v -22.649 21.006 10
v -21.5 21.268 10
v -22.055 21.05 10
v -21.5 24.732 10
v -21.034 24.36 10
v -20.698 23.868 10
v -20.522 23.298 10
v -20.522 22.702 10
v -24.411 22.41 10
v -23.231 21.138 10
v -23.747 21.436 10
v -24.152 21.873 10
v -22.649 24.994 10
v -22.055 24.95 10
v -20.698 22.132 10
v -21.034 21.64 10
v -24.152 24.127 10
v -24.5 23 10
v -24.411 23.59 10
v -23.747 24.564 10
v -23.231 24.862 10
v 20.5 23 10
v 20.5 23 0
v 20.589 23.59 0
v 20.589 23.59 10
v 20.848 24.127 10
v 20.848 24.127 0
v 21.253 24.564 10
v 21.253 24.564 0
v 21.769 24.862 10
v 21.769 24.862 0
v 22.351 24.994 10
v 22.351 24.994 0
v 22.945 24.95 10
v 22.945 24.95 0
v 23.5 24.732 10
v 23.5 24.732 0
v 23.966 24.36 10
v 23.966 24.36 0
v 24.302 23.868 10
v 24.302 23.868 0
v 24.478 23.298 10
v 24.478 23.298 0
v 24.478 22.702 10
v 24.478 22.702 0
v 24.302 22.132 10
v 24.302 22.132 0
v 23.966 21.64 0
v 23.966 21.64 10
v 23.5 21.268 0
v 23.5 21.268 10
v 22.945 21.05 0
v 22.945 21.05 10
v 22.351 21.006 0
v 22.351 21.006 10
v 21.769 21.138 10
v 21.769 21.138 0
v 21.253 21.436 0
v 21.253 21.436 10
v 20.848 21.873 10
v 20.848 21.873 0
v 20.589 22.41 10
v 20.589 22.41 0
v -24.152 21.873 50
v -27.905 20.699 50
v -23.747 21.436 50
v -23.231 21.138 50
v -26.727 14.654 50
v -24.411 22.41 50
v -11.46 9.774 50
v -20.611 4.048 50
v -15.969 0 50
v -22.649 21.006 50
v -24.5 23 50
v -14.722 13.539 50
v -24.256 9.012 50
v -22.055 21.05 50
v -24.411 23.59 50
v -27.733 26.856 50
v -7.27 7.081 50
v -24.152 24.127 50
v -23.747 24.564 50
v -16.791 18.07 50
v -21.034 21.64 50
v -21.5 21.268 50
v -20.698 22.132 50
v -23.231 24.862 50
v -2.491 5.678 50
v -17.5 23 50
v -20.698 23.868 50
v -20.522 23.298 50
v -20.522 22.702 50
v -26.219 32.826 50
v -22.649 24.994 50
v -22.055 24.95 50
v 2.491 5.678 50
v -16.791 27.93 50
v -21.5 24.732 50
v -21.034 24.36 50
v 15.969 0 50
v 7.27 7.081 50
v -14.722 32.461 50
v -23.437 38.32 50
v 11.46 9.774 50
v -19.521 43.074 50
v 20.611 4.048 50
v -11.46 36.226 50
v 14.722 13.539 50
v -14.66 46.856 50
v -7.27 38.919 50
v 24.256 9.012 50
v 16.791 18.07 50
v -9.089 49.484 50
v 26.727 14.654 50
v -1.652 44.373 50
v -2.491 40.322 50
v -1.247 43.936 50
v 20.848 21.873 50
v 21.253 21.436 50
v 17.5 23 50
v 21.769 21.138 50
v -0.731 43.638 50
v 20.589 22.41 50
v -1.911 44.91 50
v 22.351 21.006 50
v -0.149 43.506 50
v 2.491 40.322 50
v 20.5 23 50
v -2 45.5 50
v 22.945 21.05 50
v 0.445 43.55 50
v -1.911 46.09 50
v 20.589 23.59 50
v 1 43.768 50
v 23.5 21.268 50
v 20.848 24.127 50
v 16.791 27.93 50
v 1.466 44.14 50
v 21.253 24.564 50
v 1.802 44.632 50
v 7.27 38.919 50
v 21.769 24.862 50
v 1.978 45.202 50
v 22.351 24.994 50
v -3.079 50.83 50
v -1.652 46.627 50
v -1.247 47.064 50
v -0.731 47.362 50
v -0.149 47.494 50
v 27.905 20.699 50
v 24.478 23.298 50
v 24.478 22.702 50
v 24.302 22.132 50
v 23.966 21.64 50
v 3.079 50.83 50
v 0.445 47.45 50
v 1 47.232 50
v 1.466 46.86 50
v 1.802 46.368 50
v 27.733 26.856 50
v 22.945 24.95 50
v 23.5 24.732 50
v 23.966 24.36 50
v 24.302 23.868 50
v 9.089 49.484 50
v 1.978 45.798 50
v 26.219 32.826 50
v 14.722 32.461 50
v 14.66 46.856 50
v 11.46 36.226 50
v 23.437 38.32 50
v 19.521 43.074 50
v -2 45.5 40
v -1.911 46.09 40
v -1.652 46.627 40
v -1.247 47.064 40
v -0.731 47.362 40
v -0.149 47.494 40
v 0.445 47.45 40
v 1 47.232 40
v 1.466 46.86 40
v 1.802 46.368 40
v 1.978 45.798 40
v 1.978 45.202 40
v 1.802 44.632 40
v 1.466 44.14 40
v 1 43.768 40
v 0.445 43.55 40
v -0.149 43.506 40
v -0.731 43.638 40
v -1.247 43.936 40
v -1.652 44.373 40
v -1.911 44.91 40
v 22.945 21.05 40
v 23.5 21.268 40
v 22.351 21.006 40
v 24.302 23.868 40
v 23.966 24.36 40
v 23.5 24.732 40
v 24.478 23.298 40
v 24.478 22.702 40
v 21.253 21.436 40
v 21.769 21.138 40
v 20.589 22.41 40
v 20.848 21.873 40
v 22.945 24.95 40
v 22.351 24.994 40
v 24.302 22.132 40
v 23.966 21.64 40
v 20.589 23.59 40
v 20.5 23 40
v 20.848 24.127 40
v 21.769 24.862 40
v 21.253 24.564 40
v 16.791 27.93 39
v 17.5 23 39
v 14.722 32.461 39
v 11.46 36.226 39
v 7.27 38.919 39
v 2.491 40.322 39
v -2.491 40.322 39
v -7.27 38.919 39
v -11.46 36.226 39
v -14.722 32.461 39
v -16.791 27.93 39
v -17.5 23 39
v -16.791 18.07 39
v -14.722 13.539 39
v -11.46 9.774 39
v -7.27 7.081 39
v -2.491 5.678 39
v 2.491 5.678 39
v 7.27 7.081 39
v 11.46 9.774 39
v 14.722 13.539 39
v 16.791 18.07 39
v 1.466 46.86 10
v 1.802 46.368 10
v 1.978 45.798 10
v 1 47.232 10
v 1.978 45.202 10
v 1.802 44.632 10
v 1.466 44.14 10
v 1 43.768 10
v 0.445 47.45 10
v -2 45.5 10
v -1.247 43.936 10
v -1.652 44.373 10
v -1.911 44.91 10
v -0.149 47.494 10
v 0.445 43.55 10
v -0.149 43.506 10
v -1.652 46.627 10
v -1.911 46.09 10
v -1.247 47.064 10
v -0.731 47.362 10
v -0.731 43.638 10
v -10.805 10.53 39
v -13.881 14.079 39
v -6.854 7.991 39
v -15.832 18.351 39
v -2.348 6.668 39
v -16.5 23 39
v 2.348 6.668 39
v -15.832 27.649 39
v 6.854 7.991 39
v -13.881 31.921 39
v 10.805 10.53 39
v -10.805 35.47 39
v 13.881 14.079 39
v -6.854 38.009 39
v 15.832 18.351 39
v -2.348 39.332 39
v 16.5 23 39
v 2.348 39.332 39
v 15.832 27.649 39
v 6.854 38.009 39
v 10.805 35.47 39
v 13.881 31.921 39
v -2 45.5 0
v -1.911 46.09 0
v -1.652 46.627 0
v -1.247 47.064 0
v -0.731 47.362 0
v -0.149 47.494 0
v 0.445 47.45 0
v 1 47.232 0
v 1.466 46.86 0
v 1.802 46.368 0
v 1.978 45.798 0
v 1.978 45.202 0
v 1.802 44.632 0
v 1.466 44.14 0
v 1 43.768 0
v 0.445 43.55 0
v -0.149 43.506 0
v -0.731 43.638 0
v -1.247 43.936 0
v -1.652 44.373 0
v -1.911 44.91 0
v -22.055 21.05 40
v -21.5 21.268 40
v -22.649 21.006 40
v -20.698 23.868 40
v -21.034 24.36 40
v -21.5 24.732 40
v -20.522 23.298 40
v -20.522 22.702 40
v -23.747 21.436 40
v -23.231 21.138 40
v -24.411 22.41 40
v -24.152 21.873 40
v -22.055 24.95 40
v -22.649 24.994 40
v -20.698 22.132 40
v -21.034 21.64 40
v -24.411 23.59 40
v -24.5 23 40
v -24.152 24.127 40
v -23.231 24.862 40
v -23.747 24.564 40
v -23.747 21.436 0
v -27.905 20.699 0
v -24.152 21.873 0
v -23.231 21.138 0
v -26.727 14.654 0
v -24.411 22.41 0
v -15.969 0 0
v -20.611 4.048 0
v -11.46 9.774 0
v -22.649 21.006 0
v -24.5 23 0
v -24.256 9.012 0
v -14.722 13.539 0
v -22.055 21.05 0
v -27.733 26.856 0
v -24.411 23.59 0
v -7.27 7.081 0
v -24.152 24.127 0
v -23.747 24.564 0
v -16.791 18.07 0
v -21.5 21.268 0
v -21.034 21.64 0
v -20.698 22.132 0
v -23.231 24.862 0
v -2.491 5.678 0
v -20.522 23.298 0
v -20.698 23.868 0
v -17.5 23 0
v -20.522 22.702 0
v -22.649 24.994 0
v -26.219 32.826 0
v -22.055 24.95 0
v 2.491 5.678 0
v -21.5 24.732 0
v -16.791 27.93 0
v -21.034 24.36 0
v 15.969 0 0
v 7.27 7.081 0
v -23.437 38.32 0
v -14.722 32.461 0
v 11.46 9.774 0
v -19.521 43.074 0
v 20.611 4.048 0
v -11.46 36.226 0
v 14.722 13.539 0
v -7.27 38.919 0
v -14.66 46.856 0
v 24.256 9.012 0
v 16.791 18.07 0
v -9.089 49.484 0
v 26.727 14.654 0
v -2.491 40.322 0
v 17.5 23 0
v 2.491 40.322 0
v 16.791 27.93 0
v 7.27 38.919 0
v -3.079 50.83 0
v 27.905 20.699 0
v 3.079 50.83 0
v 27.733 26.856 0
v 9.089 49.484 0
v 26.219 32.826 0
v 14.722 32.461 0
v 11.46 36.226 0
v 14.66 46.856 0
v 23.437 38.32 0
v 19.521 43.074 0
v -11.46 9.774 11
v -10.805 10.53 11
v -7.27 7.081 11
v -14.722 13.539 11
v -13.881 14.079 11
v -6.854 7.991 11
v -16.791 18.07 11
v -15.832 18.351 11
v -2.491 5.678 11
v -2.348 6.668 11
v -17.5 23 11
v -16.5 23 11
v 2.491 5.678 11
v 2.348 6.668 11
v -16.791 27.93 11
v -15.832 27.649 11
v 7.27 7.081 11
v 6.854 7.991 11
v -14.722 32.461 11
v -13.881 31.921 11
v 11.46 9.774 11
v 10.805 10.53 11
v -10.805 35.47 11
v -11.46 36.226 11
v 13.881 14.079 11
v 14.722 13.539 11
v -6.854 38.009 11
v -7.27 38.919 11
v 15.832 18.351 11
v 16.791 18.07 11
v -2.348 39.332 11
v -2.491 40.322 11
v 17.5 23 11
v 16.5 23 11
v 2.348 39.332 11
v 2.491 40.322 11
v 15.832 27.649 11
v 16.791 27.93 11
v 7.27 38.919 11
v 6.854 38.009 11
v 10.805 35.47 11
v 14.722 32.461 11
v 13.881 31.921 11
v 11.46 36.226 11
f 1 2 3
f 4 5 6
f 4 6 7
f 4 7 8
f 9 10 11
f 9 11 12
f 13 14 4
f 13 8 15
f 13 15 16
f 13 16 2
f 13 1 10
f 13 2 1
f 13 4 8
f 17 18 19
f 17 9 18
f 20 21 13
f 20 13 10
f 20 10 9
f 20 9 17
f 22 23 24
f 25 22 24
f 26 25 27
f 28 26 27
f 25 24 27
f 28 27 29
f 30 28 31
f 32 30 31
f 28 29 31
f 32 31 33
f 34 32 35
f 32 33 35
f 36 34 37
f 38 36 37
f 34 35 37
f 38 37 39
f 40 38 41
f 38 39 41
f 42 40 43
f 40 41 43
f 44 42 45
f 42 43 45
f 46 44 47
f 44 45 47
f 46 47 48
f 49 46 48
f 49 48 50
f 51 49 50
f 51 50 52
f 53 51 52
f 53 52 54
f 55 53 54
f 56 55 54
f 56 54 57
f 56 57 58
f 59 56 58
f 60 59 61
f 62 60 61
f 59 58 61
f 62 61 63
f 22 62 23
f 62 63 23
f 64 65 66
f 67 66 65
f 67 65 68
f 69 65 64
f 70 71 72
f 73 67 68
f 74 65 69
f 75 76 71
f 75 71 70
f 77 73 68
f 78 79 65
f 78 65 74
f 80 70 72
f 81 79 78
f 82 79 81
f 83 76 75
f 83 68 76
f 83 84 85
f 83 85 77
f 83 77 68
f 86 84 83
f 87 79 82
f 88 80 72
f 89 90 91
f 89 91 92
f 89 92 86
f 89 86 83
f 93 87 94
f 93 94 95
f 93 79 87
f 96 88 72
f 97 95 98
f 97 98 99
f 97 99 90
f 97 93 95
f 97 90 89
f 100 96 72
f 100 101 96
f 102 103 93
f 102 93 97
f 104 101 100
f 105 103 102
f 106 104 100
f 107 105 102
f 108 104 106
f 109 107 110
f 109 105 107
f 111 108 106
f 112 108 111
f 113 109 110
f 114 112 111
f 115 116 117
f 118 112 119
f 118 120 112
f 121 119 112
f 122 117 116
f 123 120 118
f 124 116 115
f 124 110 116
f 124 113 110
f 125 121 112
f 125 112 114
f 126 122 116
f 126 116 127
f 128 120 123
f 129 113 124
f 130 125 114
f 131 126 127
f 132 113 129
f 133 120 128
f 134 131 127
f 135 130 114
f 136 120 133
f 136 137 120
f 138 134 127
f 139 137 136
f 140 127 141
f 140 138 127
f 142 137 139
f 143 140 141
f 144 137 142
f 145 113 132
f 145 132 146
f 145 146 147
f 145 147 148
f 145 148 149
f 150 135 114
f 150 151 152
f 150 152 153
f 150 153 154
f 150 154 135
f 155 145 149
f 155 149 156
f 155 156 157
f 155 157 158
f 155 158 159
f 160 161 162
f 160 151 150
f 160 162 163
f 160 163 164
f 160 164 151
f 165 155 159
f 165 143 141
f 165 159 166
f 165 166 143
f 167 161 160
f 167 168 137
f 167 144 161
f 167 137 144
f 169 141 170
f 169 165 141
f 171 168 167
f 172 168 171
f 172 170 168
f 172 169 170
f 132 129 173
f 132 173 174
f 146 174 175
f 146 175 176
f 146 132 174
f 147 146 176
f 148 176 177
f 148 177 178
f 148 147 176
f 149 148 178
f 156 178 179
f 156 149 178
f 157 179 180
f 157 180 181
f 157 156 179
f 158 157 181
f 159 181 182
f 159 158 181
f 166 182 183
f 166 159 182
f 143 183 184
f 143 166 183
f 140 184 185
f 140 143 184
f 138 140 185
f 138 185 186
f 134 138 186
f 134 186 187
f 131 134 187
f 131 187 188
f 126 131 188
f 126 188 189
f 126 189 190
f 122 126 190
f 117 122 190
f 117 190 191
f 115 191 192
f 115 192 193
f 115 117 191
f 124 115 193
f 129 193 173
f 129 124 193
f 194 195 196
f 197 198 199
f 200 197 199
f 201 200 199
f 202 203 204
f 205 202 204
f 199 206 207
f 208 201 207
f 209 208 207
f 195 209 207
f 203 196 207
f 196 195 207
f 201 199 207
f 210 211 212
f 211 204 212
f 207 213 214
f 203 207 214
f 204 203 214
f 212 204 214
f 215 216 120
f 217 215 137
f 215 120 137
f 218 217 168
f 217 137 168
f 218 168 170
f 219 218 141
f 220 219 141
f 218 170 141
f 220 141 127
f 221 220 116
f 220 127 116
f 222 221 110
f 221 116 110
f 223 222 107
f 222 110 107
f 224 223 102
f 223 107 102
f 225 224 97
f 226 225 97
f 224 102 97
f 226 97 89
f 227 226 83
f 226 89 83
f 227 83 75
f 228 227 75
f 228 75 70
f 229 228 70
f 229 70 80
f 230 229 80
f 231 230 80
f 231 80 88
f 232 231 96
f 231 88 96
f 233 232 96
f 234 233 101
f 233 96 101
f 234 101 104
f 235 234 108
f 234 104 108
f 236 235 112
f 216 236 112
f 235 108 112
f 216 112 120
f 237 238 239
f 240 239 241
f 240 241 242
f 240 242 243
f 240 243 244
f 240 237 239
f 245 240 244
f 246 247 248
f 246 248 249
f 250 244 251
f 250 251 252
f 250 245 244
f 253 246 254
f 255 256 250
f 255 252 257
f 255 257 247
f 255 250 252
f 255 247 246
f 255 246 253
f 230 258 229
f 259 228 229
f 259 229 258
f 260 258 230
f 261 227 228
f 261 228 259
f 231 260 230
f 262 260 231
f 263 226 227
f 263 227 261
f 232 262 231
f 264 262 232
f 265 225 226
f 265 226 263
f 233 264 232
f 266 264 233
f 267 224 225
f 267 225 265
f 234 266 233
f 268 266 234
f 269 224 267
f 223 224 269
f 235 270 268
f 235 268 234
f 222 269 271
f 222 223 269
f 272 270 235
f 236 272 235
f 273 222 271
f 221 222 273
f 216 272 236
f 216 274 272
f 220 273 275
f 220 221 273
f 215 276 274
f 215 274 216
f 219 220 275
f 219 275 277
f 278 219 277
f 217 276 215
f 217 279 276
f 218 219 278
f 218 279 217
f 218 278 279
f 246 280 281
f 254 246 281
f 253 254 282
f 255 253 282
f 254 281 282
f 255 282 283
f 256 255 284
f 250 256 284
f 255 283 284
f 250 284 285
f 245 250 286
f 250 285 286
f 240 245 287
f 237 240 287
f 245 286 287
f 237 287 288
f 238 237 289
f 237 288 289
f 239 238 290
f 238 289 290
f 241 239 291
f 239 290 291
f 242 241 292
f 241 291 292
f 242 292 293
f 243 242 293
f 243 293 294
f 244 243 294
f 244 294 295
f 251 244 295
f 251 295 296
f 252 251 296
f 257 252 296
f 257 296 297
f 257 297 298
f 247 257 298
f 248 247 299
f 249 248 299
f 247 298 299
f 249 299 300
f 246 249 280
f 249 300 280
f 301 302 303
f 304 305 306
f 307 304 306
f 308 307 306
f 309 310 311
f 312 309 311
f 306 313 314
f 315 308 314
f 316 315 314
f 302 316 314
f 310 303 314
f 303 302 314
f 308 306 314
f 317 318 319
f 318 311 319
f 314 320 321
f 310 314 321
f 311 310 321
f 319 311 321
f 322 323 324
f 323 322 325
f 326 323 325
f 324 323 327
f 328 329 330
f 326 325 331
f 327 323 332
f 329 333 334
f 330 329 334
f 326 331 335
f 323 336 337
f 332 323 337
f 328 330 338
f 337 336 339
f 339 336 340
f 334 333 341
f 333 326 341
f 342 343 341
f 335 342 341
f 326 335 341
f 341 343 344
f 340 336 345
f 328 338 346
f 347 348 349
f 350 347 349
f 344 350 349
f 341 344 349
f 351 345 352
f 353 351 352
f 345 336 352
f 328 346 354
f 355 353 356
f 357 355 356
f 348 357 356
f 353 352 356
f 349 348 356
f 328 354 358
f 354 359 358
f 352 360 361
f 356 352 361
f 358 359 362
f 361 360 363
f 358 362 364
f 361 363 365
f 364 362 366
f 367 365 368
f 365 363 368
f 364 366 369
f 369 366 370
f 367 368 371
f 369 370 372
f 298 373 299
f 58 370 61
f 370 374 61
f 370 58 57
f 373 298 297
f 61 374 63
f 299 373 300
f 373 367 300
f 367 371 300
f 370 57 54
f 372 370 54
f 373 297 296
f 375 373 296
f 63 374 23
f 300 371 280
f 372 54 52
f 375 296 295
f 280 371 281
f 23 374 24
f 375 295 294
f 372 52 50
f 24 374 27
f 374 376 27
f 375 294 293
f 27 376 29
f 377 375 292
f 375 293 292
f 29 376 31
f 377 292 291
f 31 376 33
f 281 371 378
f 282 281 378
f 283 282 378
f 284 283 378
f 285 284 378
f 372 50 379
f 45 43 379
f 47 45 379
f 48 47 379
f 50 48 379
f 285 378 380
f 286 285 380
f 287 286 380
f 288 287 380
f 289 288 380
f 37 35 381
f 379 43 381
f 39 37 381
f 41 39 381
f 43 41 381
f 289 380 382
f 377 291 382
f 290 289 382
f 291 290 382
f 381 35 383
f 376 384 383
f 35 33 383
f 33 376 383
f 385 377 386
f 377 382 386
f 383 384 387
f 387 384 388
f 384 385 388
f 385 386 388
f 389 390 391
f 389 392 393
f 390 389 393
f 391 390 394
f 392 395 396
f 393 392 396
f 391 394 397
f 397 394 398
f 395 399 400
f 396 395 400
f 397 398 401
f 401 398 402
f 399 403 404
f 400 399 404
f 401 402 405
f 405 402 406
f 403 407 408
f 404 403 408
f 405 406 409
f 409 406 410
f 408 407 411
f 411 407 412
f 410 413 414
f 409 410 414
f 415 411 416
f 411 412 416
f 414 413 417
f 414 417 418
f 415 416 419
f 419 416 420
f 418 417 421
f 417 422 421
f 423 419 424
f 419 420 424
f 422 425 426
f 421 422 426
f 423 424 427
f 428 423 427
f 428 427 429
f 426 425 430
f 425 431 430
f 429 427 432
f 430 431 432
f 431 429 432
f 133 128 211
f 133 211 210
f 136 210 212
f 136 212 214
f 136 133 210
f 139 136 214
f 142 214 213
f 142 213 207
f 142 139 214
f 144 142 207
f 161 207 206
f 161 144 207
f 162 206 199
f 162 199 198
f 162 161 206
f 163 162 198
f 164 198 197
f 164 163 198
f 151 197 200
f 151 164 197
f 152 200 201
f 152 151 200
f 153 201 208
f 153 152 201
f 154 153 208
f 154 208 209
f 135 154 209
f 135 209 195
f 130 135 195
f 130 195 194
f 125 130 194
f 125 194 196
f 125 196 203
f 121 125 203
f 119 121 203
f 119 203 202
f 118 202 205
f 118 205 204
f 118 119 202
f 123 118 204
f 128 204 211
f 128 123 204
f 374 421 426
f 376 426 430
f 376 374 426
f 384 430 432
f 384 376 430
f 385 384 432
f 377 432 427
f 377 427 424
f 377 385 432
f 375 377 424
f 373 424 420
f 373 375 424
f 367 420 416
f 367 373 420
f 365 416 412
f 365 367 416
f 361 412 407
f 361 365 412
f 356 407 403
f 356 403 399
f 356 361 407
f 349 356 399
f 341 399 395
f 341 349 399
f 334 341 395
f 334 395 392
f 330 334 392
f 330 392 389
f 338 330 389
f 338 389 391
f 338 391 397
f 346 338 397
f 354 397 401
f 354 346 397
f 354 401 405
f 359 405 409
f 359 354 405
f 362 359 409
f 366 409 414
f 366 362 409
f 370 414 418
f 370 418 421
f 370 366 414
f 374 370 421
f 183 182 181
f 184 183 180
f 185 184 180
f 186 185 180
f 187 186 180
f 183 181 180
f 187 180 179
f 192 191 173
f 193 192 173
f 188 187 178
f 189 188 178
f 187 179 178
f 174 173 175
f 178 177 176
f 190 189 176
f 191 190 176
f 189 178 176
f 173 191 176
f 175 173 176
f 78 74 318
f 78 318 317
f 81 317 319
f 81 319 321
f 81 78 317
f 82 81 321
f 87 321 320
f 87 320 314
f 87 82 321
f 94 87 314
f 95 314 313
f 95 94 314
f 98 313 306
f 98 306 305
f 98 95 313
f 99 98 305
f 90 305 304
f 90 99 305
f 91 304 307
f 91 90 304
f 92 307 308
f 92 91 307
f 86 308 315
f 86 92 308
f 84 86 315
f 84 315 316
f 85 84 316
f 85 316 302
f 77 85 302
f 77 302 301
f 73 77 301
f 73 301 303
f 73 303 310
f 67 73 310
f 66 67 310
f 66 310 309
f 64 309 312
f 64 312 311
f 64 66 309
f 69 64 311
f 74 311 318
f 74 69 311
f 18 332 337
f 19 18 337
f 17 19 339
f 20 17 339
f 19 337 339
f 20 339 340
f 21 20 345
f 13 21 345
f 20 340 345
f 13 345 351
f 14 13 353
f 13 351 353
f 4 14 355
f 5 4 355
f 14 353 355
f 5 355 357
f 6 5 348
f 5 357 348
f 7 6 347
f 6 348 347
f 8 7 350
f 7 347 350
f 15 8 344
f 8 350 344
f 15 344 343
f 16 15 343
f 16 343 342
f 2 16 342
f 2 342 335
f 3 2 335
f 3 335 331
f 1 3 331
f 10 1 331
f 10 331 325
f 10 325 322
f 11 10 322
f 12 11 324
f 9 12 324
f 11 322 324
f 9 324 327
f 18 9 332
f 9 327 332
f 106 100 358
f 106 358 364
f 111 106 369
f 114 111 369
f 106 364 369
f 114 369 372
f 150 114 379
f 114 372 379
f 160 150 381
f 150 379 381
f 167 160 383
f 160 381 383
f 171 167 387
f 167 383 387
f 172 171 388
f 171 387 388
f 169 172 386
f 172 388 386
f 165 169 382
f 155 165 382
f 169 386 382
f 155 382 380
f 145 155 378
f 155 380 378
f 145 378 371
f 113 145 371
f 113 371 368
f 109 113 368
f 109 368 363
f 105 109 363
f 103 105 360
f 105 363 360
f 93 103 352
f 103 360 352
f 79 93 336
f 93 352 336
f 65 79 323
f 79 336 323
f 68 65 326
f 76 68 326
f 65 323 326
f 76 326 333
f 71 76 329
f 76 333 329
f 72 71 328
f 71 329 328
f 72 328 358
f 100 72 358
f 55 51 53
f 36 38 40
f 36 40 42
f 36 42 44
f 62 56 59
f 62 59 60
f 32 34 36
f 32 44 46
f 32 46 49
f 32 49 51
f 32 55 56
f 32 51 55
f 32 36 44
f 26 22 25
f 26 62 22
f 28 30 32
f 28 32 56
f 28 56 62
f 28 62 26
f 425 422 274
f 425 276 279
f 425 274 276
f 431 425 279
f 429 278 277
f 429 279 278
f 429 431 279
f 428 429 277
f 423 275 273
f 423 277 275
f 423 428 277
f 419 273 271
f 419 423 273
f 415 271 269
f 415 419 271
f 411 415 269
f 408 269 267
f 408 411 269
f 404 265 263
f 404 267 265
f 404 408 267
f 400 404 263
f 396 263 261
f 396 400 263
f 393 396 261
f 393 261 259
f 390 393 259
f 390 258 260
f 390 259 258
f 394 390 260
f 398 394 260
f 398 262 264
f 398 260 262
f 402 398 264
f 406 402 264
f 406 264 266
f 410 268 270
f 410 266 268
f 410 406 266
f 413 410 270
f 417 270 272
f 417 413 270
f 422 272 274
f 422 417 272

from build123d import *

# Parameters (mm, degrees)
SKETCH1_R           = 16.5
BOSS_EXTRUDE1_DEPTH = 50
SKETCH2_R           = 17.5
CUT_EXTRUDE1_DEPTH  = 11
SKETCH3_R           = 2
CUT_EXTRUDE2_DEPTH  = 10


with BuildPart() as part:
    # Sketch1 → Boss-Extrude1 (new body)
    with BuildSketch(Plane.XY):
        with BuildLine():
            Line((-15.968719423, 0), (15.968719423, 0))
            ThreePointArc((15.968719423, 0), (0, 51), (-15.968719423, 0))
        make_face()
        with Locations((0, 23)):
            Circle(SKETCH1_R, mode=Mode.SUBTRACT)
    extrude(amount=BOSS_EXTRUDE1_DEPTH)

    # Sketch2 → Cut-Extrude1 (cut)
    with BuildSketch(Plane.XY.offset(50)):
        with Locations((0, 23)):
            Circle(SKETCH2_R)
    cut_extrude1 = extrude(amount=-CUT_EXTRUDE1_DEPTH, mode=Mode.SUBTRACT)

    # Mirror1: Cut-Extrude1 across plane
    add(cut_extrude1.mirror(Plane.XY.offset(25)), mode=Mode.SUBTRACT)

    # Sketch3 → Cut-Extrude2 (cut)
    with BuildSketch(Plane(origin=(0, 0, 0), x_dir=(-1, 0, 0), z_dir=(0, 0, -1))):
        with Locations((0, 45.5)):
            Circle(SKETCH3_R)
        with Locations((-22.5, 23)):
            Circle(SKETCH3_R)
        with Locations((22.5, 23)):
            Circle(SKETCH3_R)
    cut_extrude2 = extrude(amount=-CUT_EXTRUDE2_DEPTH, mode=Mode.SUBTRACT)

    # Mirror2: Cut-Extrude2 across plane
    add(cut_extrude2.mirror(Plane.XY.offset(25)), mode=Mode.SUBTRACT)


solid = part.part
